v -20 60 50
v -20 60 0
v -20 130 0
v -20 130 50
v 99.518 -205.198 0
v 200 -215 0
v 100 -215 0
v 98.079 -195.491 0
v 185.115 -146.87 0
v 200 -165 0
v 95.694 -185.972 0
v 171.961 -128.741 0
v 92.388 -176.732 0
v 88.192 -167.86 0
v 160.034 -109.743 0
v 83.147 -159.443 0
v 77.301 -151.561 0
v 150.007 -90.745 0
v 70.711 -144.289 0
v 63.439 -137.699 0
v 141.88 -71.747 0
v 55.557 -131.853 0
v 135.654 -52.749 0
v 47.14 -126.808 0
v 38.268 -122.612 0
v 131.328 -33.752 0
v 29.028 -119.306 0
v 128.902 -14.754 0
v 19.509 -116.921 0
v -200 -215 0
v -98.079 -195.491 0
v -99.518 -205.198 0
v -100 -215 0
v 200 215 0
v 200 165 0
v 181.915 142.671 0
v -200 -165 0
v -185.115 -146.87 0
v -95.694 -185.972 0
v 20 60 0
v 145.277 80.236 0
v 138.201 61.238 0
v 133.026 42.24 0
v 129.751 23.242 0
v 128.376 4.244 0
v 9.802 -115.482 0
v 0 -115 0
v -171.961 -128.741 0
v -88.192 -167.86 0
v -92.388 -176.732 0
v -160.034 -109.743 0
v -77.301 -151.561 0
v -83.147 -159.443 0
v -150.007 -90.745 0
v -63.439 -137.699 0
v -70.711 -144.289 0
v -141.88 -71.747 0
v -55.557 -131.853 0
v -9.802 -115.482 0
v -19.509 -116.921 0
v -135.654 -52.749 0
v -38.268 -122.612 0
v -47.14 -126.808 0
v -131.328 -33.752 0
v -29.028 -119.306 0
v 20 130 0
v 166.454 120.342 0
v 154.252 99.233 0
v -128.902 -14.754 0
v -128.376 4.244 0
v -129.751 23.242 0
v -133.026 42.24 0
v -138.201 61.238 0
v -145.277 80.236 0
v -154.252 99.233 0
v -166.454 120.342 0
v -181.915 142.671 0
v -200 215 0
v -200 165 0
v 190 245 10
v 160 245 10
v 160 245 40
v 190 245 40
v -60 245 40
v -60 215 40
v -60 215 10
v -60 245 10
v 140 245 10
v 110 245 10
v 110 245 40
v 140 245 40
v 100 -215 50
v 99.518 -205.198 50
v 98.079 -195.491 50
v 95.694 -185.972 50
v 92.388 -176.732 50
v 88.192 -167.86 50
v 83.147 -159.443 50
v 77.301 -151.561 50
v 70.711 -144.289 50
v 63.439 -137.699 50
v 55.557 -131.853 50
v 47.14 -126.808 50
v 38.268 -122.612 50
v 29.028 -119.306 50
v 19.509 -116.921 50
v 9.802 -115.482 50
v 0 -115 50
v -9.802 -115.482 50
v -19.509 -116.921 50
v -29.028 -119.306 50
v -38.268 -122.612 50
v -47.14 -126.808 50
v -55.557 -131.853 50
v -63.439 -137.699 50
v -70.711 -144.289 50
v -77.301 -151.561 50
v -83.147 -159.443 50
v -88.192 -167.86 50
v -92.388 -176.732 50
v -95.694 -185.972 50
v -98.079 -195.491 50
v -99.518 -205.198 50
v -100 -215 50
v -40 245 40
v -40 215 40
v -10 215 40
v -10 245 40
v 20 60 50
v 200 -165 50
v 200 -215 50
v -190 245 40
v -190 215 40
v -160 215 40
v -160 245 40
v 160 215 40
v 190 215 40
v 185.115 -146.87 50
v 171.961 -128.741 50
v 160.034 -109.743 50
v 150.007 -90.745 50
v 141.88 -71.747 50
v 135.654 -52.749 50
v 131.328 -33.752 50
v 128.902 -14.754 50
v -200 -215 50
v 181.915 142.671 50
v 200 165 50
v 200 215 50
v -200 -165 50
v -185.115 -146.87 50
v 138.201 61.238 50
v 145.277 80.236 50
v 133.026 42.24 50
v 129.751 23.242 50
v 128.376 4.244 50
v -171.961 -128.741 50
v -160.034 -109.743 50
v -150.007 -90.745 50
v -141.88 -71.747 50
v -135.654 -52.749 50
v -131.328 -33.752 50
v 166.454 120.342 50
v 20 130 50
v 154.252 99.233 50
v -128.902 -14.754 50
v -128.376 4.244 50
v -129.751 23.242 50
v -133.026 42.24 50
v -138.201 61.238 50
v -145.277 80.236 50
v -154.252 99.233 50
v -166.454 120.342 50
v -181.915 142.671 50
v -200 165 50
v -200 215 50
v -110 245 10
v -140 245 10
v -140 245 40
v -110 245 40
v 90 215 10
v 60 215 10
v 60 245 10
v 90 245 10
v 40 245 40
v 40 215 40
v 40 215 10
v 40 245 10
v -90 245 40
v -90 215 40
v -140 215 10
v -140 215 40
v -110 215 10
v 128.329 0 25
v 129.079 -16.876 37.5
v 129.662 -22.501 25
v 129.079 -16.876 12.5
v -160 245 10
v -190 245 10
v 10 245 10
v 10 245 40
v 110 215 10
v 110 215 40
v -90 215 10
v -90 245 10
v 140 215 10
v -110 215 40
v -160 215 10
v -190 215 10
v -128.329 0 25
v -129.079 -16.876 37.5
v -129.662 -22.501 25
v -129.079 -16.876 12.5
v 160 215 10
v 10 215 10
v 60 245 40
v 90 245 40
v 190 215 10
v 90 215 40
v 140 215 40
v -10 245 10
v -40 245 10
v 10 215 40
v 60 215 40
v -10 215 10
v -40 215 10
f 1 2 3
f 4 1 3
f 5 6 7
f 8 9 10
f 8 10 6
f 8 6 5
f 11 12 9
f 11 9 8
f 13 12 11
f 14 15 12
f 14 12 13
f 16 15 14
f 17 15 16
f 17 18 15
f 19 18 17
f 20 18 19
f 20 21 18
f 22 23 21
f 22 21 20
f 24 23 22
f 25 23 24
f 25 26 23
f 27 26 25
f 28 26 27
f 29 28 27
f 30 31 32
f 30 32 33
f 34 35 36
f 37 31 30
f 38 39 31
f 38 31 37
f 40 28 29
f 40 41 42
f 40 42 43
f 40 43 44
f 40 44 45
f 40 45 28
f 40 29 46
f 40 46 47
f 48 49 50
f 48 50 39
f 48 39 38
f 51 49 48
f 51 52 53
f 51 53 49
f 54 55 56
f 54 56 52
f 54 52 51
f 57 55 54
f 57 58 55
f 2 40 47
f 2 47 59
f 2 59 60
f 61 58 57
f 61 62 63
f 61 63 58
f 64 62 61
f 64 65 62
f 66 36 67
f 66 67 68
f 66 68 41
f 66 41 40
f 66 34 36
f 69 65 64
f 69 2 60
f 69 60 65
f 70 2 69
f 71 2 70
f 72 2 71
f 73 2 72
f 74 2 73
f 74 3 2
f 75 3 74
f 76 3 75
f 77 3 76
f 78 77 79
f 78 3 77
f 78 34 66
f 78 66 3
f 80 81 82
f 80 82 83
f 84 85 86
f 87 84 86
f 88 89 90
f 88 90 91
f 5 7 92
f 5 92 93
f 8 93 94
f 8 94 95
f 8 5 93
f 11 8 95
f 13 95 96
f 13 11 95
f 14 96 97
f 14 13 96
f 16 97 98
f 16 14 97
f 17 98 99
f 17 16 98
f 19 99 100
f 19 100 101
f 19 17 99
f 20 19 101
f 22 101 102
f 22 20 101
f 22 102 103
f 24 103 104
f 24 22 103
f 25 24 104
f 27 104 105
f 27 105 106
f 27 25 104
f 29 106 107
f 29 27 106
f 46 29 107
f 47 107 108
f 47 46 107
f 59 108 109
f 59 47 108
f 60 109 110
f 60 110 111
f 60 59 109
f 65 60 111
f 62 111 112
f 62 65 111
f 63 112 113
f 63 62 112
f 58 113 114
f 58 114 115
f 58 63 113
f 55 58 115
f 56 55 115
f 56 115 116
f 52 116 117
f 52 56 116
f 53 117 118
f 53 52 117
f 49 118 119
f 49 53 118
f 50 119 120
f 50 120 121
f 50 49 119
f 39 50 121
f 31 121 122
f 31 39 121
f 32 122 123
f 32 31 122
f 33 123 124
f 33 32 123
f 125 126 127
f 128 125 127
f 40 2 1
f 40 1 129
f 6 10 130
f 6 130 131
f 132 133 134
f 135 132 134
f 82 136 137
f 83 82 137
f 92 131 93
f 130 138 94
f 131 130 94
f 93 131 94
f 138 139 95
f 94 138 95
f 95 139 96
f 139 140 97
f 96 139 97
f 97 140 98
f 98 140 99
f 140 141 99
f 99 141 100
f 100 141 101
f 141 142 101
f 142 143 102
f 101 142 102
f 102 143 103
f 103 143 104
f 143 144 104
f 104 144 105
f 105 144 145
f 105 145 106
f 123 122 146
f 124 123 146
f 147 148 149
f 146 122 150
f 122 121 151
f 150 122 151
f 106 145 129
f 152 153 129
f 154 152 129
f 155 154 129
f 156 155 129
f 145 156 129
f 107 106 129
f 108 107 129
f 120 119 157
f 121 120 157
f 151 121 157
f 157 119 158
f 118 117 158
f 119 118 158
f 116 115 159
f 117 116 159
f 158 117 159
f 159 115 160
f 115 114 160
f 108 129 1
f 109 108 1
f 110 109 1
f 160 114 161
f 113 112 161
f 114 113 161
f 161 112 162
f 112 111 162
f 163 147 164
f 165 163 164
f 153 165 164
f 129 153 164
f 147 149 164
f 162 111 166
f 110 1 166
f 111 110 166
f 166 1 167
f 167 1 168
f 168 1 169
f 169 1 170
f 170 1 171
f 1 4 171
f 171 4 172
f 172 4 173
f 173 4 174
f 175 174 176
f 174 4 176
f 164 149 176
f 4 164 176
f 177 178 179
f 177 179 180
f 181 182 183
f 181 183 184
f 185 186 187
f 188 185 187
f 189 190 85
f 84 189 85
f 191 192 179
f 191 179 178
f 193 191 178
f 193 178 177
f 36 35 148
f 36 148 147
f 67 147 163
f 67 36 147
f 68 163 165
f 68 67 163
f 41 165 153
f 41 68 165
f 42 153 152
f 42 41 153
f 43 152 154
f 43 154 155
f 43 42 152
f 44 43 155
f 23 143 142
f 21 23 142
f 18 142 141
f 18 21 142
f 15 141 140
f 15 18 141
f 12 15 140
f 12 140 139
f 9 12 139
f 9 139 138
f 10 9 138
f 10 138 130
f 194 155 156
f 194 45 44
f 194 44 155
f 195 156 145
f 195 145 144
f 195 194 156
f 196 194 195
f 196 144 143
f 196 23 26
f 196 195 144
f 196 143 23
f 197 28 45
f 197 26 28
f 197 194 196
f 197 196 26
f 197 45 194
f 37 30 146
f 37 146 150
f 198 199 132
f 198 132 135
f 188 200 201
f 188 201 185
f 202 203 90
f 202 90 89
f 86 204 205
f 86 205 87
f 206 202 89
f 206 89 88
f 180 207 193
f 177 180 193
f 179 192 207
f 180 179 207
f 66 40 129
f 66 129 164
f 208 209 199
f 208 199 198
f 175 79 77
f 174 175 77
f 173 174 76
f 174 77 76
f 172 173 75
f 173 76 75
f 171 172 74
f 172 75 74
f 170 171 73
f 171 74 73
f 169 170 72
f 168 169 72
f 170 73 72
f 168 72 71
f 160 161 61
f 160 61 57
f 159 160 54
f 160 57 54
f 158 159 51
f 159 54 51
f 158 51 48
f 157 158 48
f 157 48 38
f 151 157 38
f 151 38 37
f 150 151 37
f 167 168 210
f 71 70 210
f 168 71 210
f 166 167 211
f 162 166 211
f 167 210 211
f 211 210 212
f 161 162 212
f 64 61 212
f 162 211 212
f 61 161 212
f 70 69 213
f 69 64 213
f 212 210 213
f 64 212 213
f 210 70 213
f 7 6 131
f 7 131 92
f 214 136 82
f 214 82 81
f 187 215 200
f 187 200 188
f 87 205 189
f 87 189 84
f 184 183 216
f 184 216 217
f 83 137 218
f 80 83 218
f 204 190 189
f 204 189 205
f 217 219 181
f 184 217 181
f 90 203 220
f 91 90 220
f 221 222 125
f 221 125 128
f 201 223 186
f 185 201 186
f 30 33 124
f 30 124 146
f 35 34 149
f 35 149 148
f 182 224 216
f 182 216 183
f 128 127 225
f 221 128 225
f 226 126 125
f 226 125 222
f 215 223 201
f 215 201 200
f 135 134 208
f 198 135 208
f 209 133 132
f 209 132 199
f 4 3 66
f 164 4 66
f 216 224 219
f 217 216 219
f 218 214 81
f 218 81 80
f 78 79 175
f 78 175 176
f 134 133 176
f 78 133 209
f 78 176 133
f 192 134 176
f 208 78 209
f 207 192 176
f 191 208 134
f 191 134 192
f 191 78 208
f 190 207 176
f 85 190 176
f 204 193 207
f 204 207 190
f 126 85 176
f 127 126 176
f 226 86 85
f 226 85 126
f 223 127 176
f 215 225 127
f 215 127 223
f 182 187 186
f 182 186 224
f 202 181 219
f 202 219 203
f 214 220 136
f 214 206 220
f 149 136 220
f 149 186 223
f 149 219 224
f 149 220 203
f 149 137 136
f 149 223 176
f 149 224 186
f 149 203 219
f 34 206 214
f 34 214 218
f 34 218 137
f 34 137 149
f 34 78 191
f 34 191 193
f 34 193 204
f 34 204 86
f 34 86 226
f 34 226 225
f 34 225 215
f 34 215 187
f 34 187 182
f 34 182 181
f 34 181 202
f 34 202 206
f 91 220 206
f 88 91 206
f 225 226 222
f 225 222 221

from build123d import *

# Parameters (mm, degrees)
SKETCH_1_W      = 40
SKETCH_1_H      = 70
EXTRUDE_3_DEPTH = 50
SKETCH_6_W      = 30
SKETCH_6_H      = 30
EXTRUDE_6_DEPTH = 30


with BuildPart() as part:
    # Эскиз1 → Бобышка-Вытянуть3 (new body)
    with BuildSketch(Plane.XY):
        with BuildLine():
            Line((-100, -215), (-200, -215))
            Line((-200, -215), (-200, -165))
            add(Edge.make_bspline(
                [(-200, 165), (-56.658015908, 0), (-200, -165)],
                knots=[0, 0, 0, 1, 1, 1], degree=2))
            Line((-200, 165), (-200, 215))
            Line((-200, 215), (0, 215))
            Line((0, 215), (200, 215))
            Line((200, 215), (200, 165))
            add(Edge.make_bspline(
                [(200, 165), (56.658015908, 0), (200, -165)],
                knots=[0, 0, 0, 1, 1, 1], degree=2))
            Line((200, -165), (200, -215))
            Line((200, -215), (100, -215))
            ThreePointArc((100, -215), (0, -115), (-100, -215))
        make_face()
        with Locations((0, 95)):
            Rectangle(SKETCH_1_W, SKETCH_1_H, mode=Mode.SUBTRACT)
    extrude(amount=EXTRUDE_3_DEPTH)

    # Эскиз6 → Бобышка-Вытянуть6 (add)
    with BuildSketch(Plane(origin=(0, 215, 0), x_dir=(1, 0, 0), z_dir=(0, 1, 0))):
        with Locations((-175, -25)):
            Rectangle(SKETCH_6_W, SKETCH_6_H)
        with Locations((-125, -25)):
            Rectangle(SKETCH_6_W, SKETCH_6_H)
        with Locations((-75, -25)):
            Rectangle(SKETCH_6_W, SKETCH_6_H)
        with Locations((-25, -25)):
            Rectangle(SKETCH_6_W, SKETCH_6_H)
        with Locations((25, -25)):
            Rectangle(SKETCH_6_W, SKETCH_6_H)
        with Locations((75, -25)):
            Rectangle(SKETCH_6_W, SKETCH_6_H)
        with Locations((125, -25)):
            Rectangle(SKETCH_6_W, SKETCH_6_H)
        with Locations((175, -25)):
            Rectangle(SKETCH_6_W, SKETCH_6_H)
    extrude(amount=EXTRUDE_6_DEPTH)


solid = part.part
